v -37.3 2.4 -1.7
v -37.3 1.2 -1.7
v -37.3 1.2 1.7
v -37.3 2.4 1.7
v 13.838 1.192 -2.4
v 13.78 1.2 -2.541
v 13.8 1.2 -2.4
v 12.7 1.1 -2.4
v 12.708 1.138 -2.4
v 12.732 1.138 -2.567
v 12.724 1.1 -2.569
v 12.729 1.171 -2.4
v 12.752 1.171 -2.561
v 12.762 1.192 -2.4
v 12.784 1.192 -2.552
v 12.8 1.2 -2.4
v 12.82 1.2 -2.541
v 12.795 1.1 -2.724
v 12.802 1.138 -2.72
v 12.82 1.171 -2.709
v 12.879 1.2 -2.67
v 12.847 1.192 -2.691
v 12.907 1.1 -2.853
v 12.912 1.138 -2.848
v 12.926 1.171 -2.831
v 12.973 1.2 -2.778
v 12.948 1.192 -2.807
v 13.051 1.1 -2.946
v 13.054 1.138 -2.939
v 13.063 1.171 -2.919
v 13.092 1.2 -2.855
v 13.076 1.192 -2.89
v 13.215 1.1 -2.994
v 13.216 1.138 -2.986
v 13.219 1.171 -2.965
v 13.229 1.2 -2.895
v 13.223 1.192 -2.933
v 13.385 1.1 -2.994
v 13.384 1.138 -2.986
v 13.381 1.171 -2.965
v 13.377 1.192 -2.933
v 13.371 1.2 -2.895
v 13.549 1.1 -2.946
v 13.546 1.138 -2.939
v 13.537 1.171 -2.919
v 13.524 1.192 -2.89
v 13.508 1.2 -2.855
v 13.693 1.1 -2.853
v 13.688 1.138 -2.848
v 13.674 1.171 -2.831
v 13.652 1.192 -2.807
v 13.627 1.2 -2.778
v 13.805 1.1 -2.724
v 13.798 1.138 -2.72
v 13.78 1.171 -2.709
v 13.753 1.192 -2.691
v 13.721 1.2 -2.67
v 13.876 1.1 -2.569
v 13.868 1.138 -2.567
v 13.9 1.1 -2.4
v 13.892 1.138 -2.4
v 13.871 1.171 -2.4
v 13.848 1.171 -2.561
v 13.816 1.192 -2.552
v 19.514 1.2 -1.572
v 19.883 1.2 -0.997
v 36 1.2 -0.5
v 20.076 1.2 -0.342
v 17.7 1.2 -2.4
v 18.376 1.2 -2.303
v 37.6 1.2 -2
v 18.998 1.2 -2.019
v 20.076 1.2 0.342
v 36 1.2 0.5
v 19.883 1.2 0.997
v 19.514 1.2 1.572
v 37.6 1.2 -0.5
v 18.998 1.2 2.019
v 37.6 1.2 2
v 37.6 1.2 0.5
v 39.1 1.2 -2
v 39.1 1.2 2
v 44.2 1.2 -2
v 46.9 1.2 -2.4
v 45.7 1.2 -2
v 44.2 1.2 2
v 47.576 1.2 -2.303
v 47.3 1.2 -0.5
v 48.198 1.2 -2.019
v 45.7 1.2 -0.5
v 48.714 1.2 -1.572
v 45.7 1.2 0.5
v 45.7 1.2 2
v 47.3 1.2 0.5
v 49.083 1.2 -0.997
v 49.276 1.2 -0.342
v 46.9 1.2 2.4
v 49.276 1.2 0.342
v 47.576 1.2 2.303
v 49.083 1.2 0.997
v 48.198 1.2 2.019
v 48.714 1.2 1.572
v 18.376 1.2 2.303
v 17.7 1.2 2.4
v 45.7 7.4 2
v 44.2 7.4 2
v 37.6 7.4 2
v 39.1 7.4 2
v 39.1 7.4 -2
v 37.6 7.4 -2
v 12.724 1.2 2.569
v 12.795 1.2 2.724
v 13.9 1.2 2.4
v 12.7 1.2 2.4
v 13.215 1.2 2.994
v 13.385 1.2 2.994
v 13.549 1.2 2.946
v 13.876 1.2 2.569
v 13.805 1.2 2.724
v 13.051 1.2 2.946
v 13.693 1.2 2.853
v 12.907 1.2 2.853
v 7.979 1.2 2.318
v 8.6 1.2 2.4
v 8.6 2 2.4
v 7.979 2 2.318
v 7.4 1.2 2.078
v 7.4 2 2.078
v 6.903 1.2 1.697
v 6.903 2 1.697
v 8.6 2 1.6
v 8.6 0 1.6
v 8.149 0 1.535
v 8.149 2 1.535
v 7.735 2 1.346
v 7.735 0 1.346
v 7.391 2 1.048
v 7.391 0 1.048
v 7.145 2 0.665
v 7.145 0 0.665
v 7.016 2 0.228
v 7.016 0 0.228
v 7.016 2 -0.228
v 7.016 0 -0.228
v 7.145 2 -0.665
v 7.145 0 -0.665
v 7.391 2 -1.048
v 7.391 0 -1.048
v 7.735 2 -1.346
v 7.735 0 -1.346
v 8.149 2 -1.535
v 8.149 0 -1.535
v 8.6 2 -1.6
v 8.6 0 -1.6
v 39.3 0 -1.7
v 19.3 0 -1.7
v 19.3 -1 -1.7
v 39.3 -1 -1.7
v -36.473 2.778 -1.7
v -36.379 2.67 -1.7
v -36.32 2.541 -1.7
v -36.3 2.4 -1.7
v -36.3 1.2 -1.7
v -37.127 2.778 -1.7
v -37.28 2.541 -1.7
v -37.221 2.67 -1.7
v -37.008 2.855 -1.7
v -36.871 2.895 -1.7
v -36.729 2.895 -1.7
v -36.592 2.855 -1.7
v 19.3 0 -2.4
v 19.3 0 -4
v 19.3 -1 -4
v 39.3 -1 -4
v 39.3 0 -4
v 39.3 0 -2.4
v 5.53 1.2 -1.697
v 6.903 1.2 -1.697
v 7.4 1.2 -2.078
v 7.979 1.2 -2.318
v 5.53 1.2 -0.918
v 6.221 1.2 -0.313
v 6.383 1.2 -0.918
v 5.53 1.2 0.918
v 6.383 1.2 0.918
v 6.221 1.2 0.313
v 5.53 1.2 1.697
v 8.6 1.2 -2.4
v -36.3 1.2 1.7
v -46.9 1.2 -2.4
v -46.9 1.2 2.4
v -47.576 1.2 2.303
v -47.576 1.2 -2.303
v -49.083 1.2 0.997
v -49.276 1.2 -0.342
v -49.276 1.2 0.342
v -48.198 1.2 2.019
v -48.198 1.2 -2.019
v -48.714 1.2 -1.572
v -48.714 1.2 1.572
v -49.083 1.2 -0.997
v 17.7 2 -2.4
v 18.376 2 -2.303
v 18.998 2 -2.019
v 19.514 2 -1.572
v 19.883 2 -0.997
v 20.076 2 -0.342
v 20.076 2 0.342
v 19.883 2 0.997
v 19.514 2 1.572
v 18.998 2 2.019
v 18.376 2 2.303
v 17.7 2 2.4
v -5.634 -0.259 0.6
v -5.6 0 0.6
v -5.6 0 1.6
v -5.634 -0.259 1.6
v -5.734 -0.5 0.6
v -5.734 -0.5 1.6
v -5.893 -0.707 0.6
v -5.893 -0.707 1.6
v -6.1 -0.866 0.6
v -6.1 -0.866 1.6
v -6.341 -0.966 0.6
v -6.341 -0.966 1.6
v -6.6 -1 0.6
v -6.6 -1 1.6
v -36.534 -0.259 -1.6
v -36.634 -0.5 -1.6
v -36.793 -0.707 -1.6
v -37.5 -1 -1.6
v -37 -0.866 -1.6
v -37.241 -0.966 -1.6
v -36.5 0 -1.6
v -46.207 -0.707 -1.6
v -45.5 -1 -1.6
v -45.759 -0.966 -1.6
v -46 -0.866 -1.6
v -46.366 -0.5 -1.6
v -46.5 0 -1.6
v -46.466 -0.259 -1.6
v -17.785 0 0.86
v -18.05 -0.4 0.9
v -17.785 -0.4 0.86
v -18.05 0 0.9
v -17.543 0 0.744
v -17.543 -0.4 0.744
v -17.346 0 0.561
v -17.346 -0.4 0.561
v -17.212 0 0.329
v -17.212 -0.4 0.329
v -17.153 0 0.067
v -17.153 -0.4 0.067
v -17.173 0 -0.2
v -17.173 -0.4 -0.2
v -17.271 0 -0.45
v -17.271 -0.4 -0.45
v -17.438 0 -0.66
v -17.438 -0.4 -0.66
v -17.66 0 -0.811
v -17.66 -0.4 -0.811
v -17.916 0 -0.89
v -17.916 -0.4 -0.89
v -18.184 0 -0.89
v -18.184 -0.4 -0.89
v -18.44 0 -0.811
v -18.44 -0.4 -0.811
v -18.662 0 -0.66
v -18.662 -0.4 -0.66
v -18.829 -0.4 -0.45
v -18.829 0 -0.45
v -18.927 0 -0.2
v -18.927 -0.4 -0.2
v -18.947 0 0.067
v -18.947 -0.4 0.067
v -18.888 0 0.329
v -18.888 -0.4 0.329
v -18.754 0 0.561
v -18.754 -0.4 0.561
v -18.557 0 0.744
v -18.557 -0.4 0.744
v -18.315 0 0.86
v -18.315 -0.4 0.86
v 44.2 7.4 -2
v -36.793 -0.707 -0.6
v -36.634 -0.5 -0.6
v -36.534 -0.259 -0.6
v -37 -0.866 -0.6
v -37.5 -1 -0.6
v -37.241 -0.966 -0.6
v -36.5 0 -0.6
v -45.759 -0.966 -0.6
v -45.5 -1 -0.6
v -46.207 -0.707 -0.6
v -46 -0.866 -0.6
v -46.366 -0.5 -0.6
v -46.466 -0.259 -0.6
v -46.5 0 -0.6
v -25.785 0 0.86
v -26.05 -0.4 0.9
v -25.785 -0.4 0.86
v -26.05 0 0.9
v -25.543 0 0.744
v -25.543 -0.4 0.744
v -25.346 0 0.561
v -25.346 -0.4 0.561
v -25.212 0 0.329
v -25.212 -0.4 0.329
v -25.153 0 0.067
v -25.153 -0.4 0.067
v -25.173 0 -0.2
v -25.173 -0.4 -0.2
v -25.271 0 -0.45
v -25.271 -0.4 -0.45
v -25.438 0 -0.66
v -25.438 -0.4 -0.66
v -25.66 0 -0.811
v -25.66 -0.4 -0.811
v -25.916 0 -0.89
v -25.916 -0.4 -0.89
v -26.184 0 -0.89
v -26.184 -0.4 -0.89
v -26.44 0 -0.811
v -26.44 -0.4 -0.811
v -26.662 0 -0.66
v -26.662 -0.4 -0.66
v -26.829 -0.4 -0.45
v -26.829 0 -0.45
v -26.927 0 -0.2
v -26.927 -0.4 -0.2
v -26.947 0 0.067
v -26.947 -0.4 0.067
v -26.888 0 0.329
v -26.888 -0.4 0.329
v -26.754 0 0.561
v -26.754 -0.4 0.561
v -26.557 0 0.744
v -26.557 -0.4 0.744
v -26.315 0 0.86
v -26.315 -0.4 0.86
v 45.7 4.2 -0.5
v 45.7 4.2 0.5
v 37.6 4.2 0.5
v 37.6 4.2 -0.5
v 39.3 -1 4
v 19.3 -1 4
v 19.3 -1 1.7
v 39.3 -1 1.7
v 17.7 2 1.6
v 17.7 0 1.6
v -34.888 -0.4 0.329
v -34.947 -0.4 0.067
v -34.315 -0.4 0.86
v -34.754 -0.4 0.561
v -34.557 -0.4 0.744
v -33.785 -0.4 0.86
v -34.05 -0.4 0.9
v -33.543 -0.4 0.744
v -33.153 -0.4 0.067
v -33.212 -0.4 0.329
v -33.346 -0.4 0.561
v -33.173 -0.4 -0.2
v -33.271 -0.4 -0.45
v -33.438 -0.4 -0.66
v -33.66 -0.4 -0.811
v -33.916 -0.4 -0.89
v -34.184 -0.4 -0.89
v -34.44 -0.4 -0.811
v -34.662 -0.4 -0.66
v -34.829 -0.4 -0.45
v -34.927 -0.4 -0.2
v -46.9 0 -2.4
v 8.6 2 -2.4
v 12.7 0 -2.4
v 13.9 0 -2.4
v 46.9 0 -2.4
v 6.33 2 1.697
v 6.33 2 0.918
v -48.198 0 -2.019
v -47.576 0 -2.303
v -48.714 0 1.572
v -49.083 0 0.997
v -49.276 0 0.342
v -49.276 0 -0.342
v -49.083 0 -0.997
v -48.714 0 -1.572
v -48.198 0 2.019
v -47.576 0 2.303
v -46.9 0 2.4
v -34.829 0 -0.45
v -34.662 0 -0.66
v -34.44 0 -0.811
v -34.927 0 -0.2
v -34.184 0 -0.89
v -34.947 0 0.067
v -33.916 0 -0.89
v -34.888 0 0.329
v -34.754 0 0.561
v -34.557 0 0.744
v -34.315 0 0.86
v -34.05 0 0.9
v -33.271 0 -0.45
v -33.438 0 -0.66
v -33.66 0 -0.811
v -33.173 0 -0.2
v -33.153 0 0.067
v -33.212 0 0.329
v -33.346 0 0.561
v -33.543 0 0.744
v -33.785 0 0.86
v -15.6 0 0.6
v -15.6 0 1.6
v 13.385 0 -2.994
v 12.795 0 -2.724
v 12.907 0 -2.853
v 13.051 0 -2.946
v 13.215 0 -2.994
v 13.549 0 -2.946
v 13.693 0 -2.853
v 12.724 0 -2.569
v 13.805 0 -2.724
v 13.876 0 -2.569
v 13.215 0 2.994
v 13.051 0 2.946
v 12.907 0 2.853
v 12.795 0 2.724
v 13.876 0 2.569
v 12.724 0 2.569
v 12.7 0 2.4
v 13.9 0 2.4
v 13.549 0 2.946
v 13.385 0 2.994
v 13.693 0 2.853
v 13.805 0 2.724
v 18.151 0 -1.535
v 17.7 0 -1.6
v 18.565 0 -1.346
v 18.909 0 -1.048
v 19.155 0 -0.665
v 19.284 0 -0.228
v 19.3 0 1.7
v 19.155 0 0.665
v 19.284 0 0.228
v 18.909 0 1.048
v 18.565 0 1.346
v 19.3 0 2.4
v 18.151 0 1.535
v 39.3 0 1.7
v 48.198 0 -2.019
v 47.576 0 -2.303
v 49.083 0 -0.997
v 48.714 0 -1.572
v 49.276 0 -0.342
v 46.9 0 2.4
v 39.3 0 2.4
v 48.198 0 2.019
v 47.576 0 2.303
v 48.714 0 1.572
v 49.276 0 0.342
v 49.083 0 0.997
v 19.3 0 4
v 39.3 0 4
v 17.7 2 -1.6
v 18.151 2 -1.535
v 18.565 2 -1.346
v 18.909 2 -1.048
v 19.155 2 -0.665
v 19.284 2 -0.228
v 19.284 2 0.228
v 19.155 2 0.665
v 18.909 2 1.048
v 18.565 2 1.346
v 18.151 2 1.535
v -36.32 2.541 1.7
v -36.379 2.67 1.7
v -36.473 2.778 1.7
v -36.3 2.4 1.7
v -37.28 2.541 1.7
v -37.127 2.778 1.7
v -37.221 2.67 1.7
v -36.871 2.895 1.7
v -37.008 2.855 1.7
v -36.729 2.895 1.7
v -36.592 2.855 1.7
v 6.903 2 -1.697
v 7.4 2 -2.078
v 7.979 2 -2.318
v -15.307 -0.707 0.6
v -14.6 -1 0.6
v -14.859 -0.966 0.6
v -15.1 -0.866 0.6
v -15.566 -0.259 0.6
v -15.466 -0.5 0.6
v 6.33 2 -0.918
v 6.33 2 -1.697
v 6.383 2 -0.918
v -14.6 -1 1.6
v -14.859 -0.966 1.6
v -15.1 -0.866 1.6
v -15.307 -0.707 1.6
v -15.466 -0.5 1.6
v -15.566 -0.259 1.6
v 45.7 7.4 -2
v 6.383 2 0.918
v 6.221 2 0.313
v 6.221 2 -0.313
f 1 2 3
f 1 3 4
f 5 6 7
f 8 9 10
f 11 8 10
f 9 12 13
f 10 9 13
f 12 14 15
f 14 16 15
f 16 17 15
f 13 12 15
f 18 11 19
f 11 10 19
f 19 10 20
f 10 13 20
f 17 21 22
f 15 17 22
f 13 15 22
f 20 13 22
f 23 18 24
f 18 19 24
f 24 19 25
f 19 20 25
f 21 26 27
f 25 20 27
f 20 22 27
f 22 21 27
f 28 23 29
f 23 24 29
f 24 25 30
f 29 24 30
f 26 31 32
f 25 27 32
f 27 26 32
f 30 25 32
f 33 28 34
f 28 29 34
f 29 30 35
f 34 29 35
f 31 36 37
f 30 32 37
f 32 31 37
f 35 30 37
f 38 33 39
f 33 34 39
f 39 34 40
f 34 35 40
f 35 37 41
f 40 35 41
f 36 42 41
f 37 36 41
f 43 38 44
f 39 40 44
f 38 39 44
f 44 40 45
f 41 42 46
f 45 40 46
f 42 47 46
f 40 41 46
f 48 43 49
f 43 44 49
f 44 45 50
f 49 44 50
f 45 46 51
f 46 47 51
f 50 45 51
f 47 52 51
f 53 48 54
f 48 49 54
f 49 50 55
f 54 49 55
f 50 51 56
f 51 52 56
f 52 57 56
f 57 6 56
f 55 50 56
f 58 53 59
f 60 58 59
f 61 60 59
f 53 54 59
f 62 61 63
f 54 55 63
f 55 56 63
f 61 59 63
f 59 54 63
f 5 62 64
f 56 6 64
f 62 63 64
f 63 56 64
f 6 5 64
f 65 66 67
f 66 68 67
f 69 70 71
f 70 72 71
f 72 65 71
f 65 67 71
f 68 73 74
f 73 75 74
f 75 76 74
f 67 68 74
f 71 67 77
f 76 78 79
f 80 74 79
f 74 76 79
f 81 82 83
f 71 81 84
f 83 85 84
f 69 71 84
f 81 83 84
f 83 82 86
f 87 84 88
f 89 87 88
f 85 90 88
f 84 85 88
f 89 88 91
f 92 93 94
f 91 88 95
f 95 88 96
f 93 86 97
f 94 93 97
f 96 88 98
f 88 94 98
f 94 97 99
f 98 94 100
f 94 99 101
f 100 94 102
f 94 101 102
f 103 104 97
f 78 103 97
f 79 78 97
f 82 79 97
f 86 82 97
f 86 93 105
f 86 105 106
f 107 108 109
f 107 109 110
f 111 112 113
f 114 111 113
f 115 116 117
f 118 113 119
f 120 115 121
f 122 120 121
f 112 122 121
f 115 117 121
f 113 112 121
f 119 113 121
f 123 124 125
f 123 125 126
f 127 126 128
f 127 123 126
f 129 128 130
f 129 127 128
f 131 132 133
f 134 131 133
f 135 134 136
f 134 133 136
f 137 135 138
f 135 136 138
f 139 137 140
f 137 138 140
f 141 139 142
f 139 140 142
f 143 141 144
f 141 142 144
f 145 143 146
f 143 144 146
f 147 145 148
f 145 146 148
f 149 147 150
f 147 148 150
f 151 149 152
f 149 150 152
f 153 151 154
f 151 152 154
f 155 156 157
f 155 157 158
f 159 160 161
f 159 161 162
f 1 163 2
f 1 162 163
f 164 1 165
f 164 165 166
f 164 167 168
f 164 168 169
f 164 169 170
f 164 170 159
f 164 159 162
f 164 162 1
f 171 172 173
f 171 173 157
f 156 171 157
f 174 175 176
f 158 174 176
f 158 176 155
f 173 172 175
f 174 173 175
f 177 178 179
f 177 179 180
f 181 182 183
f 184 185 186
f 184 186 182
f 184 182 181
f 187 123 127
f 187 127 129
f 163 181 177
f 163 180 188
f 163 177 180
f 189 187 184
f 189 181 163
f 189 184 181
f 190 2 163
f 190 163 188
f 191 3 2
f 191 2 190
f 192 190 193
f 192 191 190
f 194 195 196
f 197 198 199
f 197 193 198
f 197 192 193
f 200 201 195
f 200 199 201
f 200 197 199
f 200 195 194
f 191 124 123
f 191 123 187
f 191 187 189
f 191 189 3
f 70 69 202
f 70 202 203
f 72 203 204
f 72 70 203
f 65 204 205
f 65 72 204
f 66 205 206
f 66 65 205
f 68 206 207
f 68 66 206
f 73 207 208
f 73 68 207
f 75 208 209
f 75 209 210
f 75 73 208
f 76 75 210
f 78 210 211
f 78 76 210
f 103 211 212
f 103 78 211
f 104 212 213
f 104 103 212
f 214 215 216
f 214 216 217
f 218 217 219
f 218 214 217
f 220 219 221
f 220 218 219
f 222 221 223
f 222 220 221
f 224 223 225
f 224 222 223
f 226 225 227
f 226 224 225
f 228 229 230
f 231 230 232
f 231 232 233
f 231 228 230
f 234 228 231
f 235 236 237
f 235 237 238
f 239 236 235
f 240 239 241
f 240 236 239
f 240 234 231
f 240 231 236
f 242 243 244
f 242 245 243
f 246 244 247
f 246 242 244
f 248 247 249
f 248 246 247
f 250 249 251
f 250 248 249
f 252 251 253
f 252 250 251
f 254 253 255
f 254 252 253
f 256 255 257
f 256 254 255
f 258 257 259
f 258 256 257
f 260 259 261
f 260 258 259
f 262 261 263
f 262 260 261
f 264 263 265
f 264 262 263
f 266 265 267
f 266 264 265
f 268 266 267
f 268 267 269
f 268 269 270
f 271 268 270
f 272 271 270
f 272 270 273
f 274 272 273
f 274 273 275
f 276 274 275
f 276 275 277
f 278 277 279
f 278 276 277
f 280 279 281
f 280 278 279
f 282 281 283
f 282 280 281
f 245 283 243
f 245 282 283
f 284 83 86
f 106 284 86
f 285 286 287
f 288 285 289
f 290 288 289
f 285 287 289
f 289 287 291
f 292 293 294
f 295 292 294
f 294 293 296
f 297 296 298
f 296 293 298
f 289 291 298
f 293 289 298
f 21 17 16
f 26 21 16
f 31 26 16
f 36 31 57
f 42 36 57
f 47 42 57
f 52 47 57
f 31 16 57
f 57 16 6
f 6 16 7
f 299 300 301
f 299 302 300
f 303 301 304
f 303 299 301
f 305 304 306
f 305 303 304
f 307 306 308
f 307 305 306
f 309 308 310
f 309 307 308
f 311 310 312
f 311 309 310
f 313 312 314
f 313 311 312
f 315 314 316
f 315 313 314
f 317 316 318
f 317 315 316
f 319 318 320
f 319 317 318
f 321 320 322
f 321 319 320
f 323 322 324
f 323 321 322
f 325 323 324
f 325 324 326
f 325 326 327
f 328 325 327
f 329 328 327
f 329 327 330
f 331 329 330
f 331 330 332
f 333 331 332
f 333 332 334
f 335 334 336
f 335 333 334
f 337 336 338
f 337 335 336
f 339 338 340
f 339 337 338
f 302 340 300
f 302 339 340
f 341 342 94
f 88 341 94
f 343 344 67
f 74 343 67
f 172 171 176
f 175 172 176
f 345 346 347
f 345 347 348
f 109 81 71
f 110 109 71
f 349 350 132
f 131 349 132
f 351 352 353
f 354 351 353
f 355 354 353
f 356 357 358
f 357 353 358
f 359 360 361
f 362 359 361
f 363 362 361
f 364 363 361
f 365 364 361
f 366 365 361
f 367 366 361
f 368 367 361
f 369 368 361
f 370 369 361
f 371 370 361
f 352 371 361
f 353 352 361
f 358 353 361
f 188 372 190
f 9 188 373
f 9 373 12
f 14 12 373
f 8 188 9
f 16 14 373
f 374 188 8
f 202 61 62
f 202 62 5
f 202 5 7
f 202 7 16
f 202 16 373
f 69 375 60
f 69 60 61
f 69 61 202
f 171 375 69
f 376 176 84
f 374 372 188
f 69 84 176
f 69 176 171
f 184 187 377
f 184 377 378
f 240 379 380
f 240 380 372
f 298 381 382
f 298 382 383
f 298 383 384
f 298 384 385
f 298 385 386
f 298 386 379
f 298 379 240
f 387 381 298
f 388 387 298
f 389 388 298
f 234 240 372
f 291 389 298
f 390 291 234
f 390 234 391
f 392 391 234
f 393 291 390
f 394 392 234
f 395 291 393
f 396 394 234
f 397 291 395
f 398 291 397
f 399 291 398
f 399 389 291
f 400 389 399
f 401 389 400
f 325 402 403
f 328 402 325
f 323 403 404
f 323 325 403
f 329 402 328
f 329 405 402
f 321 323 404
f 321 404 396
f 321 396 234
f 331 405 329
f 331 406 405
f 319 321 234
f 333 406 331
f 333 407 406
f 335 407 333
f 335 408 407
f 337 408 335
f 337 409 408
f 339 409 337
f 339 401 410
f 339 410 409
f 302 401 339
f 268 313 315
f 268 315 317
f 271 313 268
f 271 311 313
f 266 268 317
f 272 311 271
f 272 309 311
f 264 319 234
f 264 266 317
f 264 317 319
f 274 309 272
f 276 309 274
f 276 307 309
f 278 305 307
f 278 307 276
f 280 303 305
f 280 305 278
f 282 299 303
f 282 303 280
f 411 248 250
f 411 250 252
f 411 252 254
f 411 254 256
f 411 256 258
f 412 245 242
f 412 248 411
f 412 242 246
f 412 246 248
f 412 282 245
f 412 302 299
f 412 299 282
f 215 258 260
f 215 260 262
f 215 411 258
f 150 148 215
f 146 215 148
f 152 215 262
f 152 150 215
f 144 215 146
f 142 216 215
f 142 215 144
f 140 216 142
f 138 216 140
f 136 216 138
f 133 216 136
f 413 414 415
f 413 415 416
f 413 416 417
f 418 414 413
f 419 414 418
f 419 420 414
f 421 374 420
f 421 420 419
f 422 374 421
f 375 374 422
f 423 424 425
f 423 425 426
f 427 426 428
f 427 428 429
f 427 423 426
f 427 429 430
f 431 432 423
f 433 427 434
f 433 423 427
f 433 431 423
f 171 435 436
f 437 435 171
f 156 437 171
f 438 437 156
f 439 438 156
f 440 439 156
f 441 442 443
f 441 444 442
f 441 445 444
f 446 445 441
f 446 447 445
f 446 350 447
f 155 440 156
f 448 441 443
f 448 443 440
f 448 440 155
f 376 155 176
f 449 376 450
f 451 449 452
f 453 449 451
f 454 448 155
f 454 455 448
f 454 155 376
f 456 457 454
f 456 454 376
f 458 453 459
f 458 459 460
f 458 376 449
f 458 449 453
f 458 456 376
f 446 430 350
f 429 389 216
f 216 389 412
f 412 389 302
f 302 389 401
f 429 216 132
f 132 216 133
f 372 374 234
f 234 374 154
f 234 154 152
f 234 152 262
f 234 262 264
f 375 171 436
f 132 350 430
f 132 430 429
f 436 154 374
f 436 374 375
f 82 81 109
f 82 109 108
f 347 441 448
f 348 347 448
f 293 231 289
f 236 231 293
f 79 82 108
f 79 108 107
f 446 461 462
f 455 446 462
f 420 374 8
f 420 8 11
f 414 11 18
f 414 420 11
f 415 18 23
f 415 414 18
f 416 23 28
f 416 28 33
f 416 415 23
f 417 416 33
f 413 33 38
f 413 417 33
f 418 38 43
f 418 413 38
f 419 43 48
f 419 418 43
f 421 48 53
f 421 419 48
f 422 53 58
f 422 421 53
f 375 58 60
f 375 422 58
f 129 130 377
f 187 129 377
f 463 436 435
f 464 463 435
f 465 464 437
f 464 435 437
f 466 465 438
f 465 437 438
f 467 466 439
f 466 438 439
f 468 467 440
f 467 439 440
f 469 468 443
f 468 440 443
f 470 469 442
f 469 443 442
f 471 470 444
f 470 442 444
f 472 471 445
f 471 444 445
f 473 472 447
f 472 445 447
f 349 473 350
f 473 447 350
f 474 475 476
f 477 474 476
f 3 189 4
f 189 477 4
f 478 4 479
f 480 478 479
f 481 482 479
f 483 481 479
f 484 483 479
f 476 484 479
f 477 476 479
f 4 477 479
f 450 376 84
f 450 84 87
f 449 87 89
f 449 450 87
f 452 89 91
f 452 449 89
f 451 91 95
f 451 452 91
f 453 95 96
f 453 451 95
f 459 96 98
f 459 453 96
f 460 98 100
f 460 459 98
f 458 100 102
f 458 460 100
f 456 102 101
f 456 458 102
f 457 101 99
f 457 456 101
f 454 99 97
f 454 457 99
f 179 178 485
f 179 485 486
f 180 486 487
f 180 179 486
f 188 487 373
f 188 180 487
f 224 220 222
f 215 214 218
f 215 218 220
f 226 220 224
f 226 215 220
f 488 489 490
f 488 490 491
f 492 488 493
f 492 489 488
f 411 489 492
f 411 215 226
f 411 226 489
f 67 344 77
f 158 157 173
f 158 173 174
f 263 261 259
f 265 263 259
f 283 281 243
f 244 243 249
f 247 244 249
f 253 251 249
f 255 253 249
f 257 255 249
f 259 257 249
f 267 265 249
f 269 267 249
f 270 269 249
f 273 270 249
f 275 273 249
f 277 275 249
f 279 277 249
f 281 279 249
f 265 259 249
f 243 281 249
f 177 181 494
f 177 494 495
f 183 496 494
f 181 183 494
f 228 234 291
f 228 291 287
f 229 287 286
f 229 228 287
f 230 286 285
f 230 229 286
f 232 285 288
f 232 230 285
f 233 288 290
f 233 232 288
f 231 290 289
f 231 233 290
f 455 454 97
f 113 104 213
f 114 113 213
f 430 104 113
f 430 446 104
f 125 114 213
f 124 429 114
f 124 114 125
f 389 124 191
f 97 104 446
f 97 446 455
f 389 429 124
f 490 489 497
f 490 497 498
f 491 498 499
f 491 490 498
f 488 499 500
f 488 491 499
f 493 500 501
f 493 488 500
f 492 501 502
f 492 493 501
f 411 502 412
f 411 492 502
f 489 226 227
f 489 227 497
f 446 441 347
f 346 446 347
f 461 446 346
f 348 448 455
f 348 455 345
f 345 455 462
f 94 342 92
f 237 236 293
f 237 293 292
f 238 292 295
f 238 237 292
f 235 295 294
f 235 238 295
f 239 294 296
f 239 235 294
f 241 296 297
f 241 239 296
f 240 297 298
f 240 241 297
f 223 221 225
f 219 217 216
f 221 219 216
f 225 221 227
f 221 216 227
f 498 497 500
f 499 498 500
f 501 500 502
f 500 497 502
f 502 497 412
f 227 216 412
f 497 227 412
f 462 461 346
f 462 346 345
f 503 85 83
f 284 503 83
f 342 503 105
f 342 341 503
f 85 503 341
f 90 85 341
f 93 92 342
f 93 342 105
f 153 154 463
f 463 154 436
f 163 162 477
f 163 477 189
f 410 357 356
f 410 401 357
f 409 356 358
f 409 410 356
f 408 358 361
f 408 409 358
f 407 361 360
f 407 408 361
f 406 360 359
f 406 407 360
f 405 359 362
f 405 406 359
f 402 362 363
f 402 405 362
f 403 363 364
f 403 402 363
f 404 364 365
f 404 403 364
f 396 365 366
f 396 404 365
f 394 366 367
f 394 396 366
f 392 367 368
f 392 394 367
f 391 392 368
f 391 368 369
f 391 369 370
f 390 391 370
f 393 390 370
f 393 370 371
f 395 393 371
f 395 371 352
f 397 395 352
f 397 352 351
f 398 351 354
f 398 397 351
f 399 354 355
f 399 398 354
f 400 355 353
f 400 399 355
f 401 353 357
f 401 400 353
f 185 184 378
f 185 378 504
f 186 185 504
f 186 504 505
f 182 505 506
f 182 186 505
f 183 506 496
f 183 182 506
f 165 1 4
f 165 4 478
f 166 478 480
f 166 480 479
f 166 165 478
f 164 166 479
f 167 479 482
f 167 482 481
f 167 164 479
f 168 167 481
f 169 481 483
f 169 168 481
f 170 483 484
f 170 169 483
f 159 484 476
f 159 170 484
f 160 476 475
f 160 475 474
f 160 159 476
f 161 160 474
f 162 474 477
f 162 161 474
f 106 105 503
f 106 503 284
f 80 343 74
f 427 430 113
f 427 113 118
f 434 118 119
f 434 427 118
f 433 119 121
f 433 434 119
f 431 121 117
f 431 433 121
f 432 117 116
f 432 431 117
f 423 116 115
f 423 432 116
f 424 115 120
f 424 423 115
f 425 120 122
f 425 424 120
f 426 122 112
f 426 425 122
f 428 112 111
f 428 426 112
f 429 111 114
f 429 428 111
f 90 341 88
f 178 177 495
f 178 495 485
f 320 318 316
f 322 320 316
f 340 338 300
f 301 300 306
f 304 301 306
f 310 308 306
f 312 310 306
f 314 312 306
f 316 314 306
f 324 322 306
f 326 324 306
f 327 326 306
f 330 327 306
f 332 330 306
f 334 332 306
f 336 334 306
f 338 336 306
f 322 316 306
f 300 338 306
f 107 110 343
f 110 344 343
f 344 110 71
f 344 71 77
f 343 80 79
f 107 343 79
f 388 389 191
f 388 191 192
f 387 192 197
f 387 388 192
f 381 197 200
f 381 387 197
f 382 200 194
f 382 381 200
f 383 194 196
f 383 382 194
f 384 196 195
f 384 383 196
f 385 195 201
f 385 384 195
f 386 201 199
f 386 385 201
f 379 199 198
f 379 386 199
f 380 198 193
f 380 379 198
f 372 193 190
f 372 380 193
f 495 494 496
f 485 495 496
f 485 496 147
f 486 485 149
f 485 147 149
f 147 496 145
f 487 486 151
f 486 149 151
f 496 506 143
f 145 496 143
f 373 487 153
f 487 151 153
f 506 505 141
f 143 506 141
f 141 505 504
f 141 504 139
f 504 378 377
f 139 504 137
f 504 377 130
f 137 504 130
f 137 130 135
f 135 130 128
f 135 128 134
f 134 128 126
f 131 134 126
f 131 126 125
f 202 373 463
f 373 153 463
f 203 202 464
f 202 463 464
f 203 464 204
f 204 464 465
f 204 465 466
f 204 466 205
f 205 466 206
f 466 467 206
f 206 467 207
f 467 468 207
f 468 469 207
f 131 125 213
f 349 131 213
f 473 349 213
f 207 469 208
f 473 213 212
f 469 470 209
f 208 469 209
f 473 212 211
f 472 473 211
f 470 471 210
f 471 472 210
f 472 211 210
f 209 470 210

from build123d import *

# Parameters (mm, degrees)
BOSS_EXTRUDE1_DEPTH  = 1.2
BOSS_EXTRUDE2_DEPTH  = 0.8
SKETCH3_W            = 20
SKETCH3_H            = 2.3
BOSS_EXTRUDE3_DEPTH  = 1
SKETCH4_W            = 20
SKETCH4_H            = 2.3
BOSS_EXTRUDE4_DEPTH  = 1
CUT_EXTRUDE1_START   = -0.8
CUT_EXTRUDE1_DEPTH   = 0.8
CUT_EXTRUDE2_START   = -0.8
CUT_EXTRUDE2_DEPTH   = 0.8
CUT_EXTRUDE3_DEPTH   = 50.502424183
BOSS_EXTRUDE5_DEPTH  = 1.2
BOSS_EXTRUDE6_DEPTH  = 1.2
SKETCH10_W           = 1.5
SKETCH10_H           = 4
BOSS_EXTRUDE7_DEPTH  = 6.2
SKETCH11_W           = 1.5
SKETCH11_H           = 4
BOSS_EXTRUDE8_DEPTH  = 6.2
BOSS_EXTRUDE9_DEPTH  = 3.4
BOSS_EXTRUDE10_DEPTH = 1
BOSS_EXTRUDE11_DEPTH = 1
DRAFT1_ANGLE         = 45
SKETCH15_W           = 0.9
SKETCH15_H           = 0.4
SKETCH16_W           = 0.9
SKETCH16_H           = 0.4
SKETCH17_W           = 0.9
SKETCH17_H           = 0.4
RIB1_REACH           = 52.012
SKETCH18_WALL_W      = 105.424996876
SKETCH18_WALL_H      = 1
RIB2_REACH           = 52.012
SKETCH19_WALL_W      = 105.424996876
SKETCH19_WALL_H      = 1
FILLET2_R            = 0.1


with BuildPart() as part:
    # Sketch1 → Boss-Extrude1 (new body)
    with BuildSketch(Plane.XZ):
        with BuildLine():
            Line((46.9, 2.4), (-46.9, 2.4))
            ThreePointArc((-46.9, 2.4), (-49.3, 0), (-46.9, -2.4))
            Line((-46.9, -2.4), (46.9, -2.4))
            ThreePointArc((46.9, -2.4), (49.3, 0), (46.9, 2.4))
        make_face()
    extrude(amount=-BOSS_EXTRUDE1_DEPTH)

    # Sketch2 → Boss-Extrude2 (add)
    with BuildSketch(Plane(origin=(0, 1.2, 0), x_dir=(-1, 0, 0), z_dir=(0, 1, 0))):
        with BuildLine():
            Line((-6.33, 2.4), (-6.33, 0.918))
            Line((-6.33, 0.918), (-6.382506821, 0.918))
            ThreePointArc((-6.382506821, 0.918), (-6.2, 0), (-6.382506821, -0.918))
            Line((-6.382506821, -0.918), (-6.33, -0.918))
            Line((-6.33, -0.918), (-6.33, -2.4))
            Line((-6.33, -2.4), (-17.7, -2.4))
            ThreePointArc((-17.7, -2.4), (-20.1, 0), (-17.7, 2.4))
            Line((-17.7, 2.4), (-6.33, 2.4))
        make_face()
    extrude(amount=BOSS_EXTRUDE2_DEPTH)

    # Sketch3 → Boss-Extrude3 (add)
    with BuildSketch(Plane.XZ):
        with Locations((29.3, 2.85)):
            Rectangle(SKETCH3_W, SKETCH3_H)
    extrude(amount=BOSS_EXTRUDE3_DEPTH)

    # Sketch4 → Boss-Extrude4 (add)
    with BuildSketch(Plane.XZ):
        with Locations((29.3, -2.85)):
            Rectangle(SKETCH4_W, SKETCH4_H)
    extrude(amount=BOSS_EXTRUDE4_DEPTH)

    # Sketch5 → Cut-Extrude1 (cut)
    with BuildSketch(Plane(origin=(0, 2, 0), x_dir=(-1, 0, 0), z_dir=(0, 1, 0)).offset(CUT_EXTRUDE1_START)):
        with BuildLine():
            Line((-8.6, -2.4), (-6.33, -2.4))
            Line((-6.33, -2.4), (-6.33, -1.697))
            Line((-6.33, -1.697), (-6.902887452, -1.697))
            ThreePointArc((-6.902887452, -1.697), (-7.681523, -2.21729565), (-8.6, -2.4))
        make_face()
    extrude(amount=CUT_EXTRUDE1_DEPTH, mode=Mode.SUBTRACT)

    # Sketch6 → Cut-Extrude2 (cut)
    with BuildSketch(Plane(origin=(0, 2, 0), x_dir=(-1, 0, 0), z_dir=(0, 1, 0)).offset(CUT_EXTRUDE2_START)):
        with BuildLine():
            Line((-6.902887452, 1.697), (-6.33, 1.697))
            Line((-6.33, 1.697), (-6.33, 2.4))
            Line((-6.33, 2.4), (-8.6, 2.4))
            ThreePointArc((-8.6, 2.4), (-7.681523, 2.21729565), (-6.902887452, 1.697))
        make_face()
    extrude(amount=CUT_EXTRUDE2_DEPTH, mode=Mode.SUBTRACT)

    # Sketch7 → Cut-Extrude3 (cut, through all)
    with BuildSketch(Plane.XZ):
        with BuildLine():
            Line((17.7, 1.6), (8.6, 1.6))
            ThreePointArc((8.6, 1.6), (7, 0), (8.6, -1.6))
            Line((8.6, -1.6), (17.7, -1.6))
            ThreePointArc((17.7, -1.6), (19.3, 0), (17.7, 1.6))
        make_face()
    extrude(amount=-CUT_EXTRUDE3_DEPTH, mode=Mode.SUBTRACT)

    # Sketch8 → Boss-Extrude5 (add)
    with BuildSketch(Plane.XZ):
        with BuildLine():
            Line((12.7, 2.4), (13.9, 2.4))
            ThreePointArc((13.9, 2.4), (13.3, 3), (12.7, 2.4))
        make_face()
    extrude(amount=-BOSS_EXTRUDE5_DEPTH)

    # Sketch9 → Boss-Extrude6 (add)
    with BuildSketch(Plane.XZ):
        with BuildLine():
            Line((13.9, -2.4), (12.7, -2.4))
            ThreePointArc((12.7, -2.4), (13.3, -3), (13.9, -2.4))
        make_face()
    extrude(amount=-BOSS_EXTRUDE6_DEPTH)

    # Sketch10 → Boss-Extrude7 (add)
    with BuildSketch(Plane(origin=(0, 1.2, 0), x_dir=(-1, 0, 0), z_dir=(0, 1, 0))):
        with Locations((-38.35, 0)):
            Rectangle(SKETCH10_W, SKETCH10_H)
    extrude(amount=BOSS_EXTRUDE7_DEPTH)

    # Sketch11 → Boss-Extrude8 (add)
    with BuildSketch(Plane(origin=(0, 1.2, 0), x_dir=(-1, 0, 0), z_dir=(0, 1, 0))):
        with Locations((-44.95, 0)):
            Rectangle(SKETCH11_W, SKETCH11_H)
    extrude(amount=BOSS_EXTRUDE8_DEPTH)

    # Sketch12 → Boss-Extrude9 (add)
    with BuildSketch(Plane(origin=(0, 0, -1.7), x_dir=(-1, 0, 0), z_dir=(0, 0, -1))):
        with BuildLine():
            Line((36.3, 1.2), (37.3, 1.2))
            Line((37.3, 1.2), (37.3, 2.4))
            ThreePointArc((37.3, 2.4), (36.8, 2.9), (36.3, 2.4))
            Line((36.3, 2.4), (36.3, 1.2))
        make_face()
    extrude(amount=-BOSS_EXTRUDE9_DEPTH)

    # Sketch13 → Boss-Extrude10 (add)
    with BuildSketch(Plane(origin=(0, 0, -1.6), x_dir=(-1, 0, 0), z_dir=(0, 0, -1))):
        with BuildLine():
            Line((46.5, 0), (36.5, 0))
            ThreePointArc((36.5, 0), (36.792893219, -0.707106781), (37.5, -1))
            Line((37.5, -1), (45.5, -1))
            ThreePointArc((45.5, -1), (46.207106781, -0.707106781), (46.5, 0))
        make_face()
    extrude(amount=-BOSS_EXTRUDE10_DEPTH)

    # Sketch14 → Boss-Extrude11 (add)
    with BuildSketch(Plane(origin=(0, 0, 0.6), x_dir=(-1, 0, 0), z_dir=(0, 0, -1))):
        with BuildLine():
            Line((15.6, 0), (5.6, 0))
            ThreePointArc((5.6, 0), (5.892893219, -0.707106781), (6.6, -1))
            Line((6.6, -1), (14.6, -1))
            ThreePointArc((14.6, -1), (15.307106781, -0.707106781), (15.6, 0))
        make_face()
    extrude(amount=-BOSS_EXTRUDE11_DEPTH)

    # Draft1
    draft1_faces = [part.faces().sort_by_distance(p)[0] for p in [
        (6.33, 1.6, -1.3075),
        (6.33, 1.6, 1.3075),
    ]]
    draft(draft1_faces, Plane(origin=(8.6, 2, 0), x_dir=(1, 0, 0), z_dir=(0, 1, 0)), DRAFT1_ANGLE)

    # Sketch15 → Revolve1 (revolve)
    with BuildSketch(Plane(origin=(0, 0, 0), x_dir=(-1, 0, 0), z_dir=(0, 0, -1)), mode=Mode.PRIVATE) as revolve1_sk:
        with Locations((25.6, -0.2)):
            Rectangle(SKETCH15_W, SKETCH15_H)
    revolve(revolve1_sk.sketch.rotate(Axis((-26.05, -0.4, 0), (0, 1, 0)), 270), axis=Axis((-26.05, -0.4, 0), (0, 1, 0)))

    # Sketch16 → Revolve2 (revolve)
    with BuildSketch(Plane(origin=(0, 0, 0), x_dir=(-1, 0, 0), z_dir=(0, 0, -1)), mode=Mode.PRIVATE) as revolve2_sk:
        with Locations((33.6, -0.2)):
            Rectangle(SKETCH16_W, SKETCH16_H)
    revolve(revolve2_sk.sketch.rotate(Axis((-34.05, -0.4, 0), (0, 1, 0)), 270), axis=Axis((-34.05, -0.4, 0), (0, 1, 0)))

    # Sketch17 → Revolve3 (revolve)
    with BuildSketch(Plane(origin=(0, 0, 0), x_dir=(-1, 0, 0), z_dir=(0, 0, -1)), mode=Mode.PRIVATE) as revolve3_sk:
        with Locations((17.6, -0.2)):
            Rectangle(SKETCH17_W, SKETCH17_H)
    revolve(revolve3_sk.sketch.rotate(Axis((-18.05, -0.4, 0), (0, 1, 0)), 270), axis=Axis((-18.05, -0.4, 0), (0, 1, 0)))

    # Sketch18 wall → Rib1 (add, up to next)
    with BuildSketch(Plane(origin=(46.5, 2.7, 0), x_dir=(0.470588235294, -0.882352941176, 0), z_dir=(-0.882352941176, -0.470588235294, 0)), mode=Mode.PRIVATE) as rib1_sk1:
        Rectangle(SKETCH18_WALL_W, SKETCH18_WALL_H)
    rib1_tool1 = extrude(rib1_sk1.sketch, amount=RIB1_REACH, mode=Mode.PRIVATE) - part.part
    add(rib1_tool1.solids().sort_by_distance((46.5, 2.7, 0))[0])

    # Sketch19 wall → Rib2 (add, up to next)
    with BuildSketch(Plane(origin=(36.8, 2.7, 0), x_dir=(-0.470588235294, -0.882352941176, 0), z_dir=(0.882352941176, -0.470588235294, 0)), mode=Mode.PRIVATE) as rib2_sk1:
        Rectangle(SKETCH19_WALL_W, SKETCH19_WALL_H)
    rib2_tool1 = extrude(rib2_sk1.sketch, amount=RIB2_REACH, mode=Mode.PRIVATE) - part.part
    add(rib2_tool1.solids().sort_by_distance((36.8, 2.7, 0))[0])

    # Fillet2
    fillet2_edges = [part.edges().sort_by_distance(p)[0] for p in [
        (13.3, 1.2, -3),
    ]]
    fillet(fillet2_edges, radius=FILLET2_R)


solid = part.part
